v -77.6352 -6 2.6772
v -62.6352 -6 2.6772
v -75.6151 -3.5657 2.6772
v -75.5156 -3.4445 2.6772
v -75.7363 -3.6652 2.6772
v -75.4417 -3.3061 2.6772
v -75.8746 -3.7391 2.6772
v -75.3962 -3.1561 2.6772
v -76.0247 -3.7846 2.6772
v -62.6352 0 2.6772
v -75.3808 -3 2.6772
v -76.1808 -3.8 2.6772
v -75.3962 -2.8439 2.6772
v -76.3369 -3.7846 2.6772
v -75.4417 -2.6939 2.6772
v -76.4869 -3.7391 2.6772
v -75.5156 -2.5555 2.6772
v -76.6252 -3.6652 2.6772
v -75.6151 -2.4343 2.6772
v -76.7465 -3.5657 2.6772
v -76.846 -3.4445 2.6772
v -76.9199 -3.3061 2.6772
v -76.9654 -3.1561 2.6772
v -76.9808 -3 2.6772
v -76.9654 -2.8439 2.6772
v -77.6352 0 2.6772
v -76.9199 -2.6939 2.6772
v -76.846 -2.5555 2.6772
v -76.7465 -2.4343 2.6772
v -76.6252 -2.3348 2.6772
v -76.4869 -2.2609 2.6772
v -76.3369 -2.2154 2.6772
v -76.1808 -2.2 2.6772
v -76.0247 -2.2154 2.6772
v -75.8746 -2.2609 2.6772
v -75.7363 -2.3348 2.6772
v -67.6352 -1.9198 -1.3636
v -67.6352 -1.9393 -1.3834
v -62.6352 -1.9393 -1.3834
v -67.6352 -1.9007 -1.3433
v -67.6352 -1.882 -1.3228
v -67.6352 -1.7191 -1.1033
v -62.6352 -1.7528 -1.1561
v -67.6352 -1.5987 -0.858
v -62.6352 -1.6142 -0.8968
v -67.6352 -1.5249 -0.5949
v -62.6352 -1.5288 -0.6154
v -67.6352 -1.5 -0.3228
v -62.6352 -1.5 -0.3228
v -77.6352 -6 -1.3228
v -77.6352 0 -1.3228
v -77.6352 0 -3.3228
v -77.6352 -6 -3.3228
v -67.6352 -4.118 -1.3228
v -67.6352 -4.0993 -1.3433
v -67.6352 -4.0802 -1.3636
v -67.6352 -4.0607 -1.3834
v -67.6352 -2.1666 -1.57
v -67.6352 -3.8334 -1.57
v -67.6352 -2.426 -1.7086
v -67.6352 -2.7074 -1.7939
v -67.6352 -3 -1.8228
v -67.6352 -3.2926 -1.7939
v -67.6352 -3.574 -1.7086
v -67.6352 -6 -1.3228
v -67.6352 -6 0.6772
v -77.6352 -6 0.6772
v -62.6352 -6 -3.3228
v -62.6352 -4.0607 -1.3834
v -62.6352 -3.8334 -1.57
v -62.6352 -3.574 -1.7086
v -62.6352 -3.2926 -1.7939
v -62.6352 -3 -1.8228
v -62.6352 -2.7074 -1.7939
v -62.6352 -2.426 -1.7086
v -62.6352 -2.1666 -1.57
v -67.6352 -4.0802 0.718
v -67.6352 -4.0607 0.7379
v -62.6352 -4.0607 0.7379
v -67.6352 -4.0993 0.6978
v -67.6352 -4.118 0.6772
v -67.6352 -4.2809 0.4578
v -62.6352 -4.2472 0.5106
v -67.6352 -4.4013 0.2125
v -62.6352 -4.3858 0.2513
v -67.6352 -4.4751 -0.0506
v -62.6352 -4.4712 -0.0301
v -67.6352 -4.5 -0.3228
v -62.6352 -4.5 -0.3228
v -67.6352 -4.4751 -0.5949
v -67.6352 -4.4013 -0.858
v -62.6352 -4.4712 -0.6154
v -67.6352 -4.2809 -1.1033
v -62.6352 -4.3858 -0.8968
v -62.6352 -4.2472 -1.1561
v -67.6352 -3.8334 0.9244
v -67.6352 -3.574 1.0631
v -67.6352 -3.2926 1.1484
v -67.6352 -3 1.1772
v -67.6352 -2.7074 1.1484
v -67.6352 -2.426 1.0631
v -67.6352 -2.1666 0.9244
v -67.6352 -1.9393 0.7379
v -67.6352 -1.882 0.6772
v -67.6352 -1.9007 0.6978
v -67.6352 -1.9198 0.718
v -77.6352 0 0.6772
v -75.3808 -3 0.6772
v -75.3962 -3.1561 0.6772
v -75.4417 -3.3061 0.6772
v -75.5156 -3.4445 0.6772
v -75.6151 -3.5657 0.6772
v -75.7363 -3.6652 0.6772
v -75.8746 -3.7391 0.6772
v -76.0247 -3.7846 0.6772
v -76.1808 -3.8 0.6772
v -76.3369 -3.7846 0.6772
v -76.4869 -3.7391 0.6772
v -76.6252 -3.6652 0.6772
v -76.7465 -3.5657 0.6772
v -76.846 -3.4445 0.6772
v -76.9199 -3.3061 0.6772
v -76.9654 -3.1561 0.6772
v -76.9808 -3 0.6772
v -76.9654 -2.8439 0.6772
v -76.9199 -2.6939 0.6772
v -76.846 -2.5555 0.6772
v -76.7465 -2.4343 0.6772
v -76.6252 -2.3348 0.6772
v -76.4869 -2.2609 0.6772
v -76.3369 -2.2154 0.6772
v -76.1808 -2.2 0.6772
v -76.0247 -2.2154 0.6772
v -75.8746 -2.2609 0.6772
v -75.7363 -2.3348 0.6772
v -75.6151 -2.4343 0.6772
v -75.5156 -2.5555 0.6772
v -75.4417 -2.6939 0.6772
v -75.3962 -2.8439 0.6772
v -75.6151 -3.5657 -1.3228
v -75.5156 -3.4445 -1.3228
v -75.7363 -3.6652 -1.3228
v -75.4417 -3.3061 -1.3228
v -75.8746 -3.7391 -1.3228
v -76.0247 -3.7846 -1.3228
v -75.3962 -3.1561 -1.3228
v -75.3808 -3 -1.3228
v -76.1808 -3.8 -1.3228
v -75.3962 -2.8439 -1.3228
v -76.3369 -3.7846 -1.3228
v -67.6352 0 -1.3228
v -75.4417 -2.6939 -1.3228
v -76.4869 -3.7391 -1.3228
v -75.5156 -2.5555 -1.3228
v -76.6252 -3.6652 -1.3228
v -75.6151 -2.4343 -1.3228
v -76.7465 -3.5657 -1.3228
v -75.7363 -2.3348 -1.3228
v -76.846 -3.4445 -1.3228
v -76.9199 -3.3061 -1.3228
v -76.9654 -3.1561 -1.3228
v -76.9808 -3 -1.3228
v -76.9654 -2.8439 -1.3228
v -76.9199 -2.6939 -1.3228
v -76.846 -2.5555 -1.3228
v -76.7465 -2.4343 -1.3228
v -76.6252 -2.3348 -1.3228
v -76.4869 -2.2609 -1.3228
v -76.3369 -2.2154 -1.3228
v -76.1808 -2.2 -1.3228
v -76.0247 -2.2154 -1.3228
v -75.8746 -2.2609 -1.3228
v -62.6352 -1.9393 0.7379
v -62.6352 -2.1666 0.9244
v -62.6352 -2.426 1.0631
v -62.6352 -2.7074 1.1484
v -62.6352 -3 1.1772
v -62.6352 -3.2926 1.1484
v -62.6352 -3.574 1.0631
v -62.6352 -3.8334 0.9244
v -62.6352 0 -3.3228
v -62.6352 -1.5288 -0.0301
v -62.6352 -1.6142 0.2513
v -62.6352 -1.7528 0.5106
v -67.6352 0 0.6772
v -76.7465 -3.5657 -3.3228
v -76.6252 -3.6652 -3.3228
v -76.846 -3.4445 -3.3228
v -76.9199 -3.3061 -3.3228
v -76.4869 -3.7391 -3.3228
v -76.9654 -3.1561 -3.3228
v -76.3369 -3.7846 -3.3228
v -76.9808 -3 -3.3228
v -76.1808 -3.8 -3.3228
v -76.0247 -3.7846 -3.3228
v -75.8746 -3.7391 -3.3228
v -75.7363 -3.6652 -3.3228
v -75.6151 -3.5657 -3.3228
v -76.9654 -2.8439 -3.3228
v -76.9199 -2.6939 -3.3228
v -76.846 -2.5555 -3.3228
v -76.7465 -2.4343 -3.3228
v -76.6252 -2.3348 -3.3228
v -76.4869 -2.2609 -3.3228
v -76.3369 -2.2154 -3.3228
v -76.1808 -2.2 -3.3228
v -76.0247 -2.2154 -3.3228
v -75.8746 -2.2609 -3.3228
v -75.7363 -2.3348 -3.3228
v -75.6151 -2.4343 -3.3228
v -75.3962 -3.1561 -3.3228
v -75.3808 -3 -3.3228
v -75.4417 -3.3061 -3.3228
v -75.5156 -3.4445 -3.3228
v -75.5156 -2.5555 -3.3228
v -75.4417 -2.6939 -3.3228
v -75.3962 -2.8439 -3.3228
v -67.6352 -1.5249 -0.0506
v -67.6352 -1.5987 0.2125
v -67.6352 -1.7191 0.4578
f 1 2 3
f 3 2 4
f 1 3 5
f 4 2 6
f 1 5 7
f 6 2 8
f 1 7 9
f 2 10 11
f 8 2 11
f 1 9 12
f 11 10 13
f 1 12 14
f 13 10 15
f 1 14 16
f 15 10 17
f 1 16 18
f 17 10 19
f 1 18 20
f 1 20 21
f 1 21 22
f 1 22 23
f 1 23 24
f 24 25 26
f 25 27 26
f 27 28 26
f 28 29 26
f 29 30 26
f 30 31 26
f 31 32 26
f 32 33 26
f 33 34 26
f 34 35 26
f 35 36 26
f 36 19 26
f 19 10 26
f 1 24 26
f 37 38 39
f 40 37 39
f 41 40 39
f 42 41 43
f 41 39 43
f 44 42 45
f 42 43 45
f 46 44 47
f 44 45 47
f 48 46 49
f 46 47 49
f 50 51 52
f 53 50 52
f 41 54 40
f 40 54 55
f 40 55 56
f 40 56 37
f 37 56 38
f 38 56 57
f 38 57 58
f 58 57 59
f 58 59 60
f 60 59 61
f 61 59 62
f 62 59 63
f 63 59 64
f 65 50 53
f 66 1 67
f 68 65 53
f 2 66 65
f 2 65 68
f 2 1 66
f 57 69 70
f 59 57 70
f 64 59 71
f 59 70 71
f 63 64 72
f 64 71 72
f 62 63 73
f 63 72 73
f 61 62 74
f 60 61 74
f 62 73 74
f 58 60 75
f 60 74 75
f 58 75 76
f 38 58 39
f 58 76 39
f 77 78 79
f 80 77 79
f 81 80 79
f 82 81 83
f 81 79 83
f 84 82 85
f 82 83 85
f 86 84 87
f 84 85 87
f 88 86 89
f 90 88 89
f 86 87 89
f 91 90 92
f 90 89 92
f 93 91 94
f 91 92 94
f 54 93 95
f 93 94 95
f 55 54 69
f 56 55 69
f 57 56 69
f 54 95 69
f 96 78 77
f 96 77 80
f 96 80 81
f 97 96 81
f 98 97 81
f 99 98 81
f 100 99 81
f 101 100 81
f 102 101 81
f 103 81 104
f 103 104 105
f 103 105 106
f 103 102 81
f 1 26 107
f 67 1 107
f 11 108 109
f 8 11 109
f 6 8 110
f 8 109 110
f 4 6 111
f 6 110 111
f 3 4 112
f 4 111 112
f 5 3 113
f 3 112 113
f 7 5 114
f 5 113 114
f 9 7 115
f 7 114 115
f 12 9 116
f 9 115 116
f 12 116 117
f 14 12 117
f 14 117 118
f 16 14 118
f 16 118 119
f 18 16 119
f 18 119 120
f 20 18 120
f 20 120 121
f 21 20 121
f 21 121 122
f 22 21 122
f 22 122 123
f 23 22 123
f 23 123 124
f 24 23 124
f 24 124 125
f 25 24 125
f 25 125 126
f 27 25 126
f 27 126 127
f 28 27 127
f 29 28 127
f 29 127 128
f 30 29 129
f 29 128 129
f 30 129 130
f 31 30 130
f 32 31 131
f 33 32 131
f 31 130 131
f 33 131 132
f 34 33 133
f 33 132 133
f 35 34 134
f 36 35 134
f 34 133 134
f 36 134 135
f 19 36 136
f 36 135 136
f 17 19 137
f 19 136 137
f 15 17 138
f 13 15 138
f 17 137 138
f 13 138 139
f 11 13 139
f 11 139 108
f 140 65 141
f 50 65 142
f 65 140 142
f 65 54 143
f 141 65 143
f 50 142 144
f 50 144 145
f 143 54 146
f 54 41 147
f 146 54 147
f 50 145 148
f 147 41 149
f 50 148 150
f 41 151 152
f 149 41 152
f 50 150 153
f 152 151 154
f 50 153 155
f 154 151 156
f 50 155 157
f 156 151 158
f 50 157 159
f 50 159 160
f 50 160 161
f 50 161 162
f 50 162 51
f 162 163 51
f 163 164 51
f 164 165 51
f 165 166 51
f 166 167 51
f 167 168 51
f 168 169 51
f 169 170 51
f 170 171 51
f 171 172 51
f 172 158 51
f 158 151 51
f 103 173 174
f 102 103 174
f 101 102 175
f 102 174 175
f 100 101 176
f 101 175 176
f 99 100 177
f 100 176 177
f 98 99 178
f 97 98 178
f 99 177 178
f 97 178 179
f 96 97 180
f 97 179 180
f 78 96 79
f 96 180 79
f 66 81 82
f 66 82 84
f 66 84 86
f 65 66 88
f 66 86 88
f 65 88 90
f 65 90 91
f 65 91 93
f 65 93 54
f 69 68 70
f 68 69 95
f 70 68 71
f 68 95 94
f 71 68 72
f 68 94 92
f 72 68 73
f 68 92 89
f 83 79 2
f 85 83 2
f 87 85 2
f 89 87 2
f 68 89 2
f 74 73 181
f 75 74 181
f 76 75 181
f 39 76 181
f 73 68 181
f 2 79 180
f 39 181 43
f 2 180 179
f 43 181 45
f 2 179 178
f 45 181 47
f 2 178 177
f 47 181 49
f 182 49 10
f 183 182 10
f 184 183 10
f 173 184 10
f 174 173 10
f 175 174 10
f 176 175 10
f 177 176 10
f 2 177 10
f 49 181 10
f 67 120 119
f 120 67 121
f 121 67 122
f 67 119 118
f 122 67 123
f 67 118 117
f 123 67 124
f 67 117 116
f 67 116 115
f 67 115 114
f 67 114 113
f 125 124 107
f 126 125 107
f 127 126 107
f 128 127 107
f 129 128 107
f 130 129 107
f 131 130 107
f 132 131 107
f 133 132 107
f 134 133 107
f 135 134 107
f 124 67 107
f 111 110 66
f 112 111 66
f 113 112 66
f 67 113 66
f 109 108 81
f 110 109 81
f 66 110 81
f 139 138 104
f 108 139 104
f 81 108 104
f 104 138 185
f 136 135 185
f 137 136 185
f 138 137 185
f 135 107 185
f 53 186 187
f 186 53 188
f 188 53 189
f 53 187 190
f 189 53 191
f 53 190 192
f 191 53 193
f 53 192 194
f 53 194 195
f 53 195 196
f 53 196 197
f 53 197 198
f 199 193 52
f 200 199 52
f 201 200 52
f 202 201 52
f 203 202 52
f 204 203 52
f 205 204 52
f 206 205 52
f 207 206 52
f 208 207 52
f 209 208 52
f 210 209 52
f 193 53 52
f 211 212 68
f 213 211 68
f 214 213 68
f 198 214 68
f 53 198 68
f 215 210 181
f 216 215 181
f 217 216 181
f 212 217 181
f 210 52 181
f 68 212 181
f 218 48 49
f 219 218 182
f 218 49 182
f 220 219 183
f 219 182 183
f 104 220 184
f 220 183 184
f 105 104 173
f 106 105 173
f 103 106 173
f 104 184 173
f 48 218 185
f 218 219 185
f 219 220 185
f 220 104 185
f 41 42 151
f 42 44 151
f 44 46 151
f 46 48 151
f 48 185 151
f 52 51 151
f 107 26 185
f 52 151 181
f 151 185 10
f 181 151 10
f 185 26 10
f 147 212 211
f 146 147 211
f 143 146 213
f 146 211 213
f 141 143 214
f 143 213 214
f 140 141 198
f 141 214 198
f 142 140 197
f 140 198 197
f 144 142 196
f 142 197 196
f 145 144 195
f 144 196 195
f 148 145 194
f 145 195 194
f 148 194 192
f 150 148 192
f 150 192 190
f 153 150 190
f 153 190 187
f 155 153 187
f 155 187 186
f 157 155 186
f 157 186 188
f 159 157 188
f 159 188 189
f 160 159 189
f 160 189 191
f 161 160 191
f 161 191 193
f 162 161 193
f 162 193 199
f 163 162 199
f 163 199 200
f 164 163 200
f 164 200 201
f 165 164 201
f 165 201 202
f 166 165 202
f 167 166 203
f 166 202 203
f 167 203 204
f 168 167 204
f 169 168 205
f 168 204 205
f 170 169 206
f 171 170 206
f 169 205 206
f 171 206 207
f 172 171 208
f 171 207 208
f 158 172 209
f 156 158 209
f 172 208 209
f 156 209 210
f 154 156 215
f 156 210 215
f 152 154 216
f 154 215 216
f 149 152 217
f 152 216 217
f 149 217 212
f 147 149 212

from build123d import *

# Parameters (mm, degrees)
F1_DEPTH = 6
F3_DEPTH = 5
F4_R     = 0.8
F5_DEPTH = 25


with BuildPart() as f1:
    # F0 (on Front) → F1 (new body)
    with BuildSketch(Plane.XZ):
        Polygon((-62.6351881424, 2.6772396487), (-77.6351881424, 2.6772396487), (-77.6351881424, 0.6772396487), (-67.6351881424, 0.6772396487), (-67.6351881424, -1.3227603513), (-77.6351881424, -1.3227603513), (-77.6351881424, -3.3227603513), (-62.6351881424, -3.3227603513), align=None)
    extrude(amount=F1_DEPTH)

    # F2 (on face) → F3 (cut)
    with BuildSketch(Plane.YZ.offset(-62.6351881424)):
        with BuildLine():
            Line((-1.9393398282, -1.3834205231), (-3, -0.3227603513))
            Line((-3, -0.3227603513), (-4.0606601718, -1.3834205231))
            ThreePointArc((-4.0606601718, -1.3834205231), (-3, -1.8227603513), (-1.9393398282, -1.3834205231))
        make_face()
        with BuildLine():
            Line((-1.9393398282, 0.7378998205), (-3, -0.3227603513))
            Line((-3, -0.3227603513), (-1.9393398282, -1.3834205231))
            ThreePointArc((-1.9393398282, -1.3834205231), (-1.6141807012, -0.8967854998), (-1.5, -0.3227603513))
            ThreePointArc((-1.5, -0.3227603513), (-1.6141807012, 0.2512647973), (-1.9393398282, 0.7378998205))
        make_face()
        with BuildLine():
            ThreePointArc((-1.9393398282, 0.7378998205), (-3, 1.1772396487), (-4.0606601718, 0.7378998205))
            Line((-4.0606601718, 0.7378998205), (-3, -0.3227603513))
            Line((-3, -0.3227603513), (-1.9393398282, 0.7378998205))
        make_face()
        with BuildLine():
            Line((-3, -0.3227603513), (-4.0606601718, 0.7378998205))
            ThreePointArc((-4.0606601718, 0.7378998205), (-4.5, -0.3227603513), (-4.0606601718, -1.3834205231))
            Line((-4.0606601718, -1.3834205231), (-3, -0.3227603513))
        make_face()
    extrude(amount=-F3_DEPTH, mode=Mode.SUBTRACT)

    # F4 (on face) → F5 (cut)
    with BuildSketch(Plane(origin=(0, 0, -3.3227603513), x_dir=(1, 0, 0), z_dir=(0, 0, -1))):
        with Locations((-76.1807858944, 3)):
            Circle(F4_R)
    extrude(amount=-F5_DEPTH, mode=Mode.SUBTRACT)


solid = f1.part
